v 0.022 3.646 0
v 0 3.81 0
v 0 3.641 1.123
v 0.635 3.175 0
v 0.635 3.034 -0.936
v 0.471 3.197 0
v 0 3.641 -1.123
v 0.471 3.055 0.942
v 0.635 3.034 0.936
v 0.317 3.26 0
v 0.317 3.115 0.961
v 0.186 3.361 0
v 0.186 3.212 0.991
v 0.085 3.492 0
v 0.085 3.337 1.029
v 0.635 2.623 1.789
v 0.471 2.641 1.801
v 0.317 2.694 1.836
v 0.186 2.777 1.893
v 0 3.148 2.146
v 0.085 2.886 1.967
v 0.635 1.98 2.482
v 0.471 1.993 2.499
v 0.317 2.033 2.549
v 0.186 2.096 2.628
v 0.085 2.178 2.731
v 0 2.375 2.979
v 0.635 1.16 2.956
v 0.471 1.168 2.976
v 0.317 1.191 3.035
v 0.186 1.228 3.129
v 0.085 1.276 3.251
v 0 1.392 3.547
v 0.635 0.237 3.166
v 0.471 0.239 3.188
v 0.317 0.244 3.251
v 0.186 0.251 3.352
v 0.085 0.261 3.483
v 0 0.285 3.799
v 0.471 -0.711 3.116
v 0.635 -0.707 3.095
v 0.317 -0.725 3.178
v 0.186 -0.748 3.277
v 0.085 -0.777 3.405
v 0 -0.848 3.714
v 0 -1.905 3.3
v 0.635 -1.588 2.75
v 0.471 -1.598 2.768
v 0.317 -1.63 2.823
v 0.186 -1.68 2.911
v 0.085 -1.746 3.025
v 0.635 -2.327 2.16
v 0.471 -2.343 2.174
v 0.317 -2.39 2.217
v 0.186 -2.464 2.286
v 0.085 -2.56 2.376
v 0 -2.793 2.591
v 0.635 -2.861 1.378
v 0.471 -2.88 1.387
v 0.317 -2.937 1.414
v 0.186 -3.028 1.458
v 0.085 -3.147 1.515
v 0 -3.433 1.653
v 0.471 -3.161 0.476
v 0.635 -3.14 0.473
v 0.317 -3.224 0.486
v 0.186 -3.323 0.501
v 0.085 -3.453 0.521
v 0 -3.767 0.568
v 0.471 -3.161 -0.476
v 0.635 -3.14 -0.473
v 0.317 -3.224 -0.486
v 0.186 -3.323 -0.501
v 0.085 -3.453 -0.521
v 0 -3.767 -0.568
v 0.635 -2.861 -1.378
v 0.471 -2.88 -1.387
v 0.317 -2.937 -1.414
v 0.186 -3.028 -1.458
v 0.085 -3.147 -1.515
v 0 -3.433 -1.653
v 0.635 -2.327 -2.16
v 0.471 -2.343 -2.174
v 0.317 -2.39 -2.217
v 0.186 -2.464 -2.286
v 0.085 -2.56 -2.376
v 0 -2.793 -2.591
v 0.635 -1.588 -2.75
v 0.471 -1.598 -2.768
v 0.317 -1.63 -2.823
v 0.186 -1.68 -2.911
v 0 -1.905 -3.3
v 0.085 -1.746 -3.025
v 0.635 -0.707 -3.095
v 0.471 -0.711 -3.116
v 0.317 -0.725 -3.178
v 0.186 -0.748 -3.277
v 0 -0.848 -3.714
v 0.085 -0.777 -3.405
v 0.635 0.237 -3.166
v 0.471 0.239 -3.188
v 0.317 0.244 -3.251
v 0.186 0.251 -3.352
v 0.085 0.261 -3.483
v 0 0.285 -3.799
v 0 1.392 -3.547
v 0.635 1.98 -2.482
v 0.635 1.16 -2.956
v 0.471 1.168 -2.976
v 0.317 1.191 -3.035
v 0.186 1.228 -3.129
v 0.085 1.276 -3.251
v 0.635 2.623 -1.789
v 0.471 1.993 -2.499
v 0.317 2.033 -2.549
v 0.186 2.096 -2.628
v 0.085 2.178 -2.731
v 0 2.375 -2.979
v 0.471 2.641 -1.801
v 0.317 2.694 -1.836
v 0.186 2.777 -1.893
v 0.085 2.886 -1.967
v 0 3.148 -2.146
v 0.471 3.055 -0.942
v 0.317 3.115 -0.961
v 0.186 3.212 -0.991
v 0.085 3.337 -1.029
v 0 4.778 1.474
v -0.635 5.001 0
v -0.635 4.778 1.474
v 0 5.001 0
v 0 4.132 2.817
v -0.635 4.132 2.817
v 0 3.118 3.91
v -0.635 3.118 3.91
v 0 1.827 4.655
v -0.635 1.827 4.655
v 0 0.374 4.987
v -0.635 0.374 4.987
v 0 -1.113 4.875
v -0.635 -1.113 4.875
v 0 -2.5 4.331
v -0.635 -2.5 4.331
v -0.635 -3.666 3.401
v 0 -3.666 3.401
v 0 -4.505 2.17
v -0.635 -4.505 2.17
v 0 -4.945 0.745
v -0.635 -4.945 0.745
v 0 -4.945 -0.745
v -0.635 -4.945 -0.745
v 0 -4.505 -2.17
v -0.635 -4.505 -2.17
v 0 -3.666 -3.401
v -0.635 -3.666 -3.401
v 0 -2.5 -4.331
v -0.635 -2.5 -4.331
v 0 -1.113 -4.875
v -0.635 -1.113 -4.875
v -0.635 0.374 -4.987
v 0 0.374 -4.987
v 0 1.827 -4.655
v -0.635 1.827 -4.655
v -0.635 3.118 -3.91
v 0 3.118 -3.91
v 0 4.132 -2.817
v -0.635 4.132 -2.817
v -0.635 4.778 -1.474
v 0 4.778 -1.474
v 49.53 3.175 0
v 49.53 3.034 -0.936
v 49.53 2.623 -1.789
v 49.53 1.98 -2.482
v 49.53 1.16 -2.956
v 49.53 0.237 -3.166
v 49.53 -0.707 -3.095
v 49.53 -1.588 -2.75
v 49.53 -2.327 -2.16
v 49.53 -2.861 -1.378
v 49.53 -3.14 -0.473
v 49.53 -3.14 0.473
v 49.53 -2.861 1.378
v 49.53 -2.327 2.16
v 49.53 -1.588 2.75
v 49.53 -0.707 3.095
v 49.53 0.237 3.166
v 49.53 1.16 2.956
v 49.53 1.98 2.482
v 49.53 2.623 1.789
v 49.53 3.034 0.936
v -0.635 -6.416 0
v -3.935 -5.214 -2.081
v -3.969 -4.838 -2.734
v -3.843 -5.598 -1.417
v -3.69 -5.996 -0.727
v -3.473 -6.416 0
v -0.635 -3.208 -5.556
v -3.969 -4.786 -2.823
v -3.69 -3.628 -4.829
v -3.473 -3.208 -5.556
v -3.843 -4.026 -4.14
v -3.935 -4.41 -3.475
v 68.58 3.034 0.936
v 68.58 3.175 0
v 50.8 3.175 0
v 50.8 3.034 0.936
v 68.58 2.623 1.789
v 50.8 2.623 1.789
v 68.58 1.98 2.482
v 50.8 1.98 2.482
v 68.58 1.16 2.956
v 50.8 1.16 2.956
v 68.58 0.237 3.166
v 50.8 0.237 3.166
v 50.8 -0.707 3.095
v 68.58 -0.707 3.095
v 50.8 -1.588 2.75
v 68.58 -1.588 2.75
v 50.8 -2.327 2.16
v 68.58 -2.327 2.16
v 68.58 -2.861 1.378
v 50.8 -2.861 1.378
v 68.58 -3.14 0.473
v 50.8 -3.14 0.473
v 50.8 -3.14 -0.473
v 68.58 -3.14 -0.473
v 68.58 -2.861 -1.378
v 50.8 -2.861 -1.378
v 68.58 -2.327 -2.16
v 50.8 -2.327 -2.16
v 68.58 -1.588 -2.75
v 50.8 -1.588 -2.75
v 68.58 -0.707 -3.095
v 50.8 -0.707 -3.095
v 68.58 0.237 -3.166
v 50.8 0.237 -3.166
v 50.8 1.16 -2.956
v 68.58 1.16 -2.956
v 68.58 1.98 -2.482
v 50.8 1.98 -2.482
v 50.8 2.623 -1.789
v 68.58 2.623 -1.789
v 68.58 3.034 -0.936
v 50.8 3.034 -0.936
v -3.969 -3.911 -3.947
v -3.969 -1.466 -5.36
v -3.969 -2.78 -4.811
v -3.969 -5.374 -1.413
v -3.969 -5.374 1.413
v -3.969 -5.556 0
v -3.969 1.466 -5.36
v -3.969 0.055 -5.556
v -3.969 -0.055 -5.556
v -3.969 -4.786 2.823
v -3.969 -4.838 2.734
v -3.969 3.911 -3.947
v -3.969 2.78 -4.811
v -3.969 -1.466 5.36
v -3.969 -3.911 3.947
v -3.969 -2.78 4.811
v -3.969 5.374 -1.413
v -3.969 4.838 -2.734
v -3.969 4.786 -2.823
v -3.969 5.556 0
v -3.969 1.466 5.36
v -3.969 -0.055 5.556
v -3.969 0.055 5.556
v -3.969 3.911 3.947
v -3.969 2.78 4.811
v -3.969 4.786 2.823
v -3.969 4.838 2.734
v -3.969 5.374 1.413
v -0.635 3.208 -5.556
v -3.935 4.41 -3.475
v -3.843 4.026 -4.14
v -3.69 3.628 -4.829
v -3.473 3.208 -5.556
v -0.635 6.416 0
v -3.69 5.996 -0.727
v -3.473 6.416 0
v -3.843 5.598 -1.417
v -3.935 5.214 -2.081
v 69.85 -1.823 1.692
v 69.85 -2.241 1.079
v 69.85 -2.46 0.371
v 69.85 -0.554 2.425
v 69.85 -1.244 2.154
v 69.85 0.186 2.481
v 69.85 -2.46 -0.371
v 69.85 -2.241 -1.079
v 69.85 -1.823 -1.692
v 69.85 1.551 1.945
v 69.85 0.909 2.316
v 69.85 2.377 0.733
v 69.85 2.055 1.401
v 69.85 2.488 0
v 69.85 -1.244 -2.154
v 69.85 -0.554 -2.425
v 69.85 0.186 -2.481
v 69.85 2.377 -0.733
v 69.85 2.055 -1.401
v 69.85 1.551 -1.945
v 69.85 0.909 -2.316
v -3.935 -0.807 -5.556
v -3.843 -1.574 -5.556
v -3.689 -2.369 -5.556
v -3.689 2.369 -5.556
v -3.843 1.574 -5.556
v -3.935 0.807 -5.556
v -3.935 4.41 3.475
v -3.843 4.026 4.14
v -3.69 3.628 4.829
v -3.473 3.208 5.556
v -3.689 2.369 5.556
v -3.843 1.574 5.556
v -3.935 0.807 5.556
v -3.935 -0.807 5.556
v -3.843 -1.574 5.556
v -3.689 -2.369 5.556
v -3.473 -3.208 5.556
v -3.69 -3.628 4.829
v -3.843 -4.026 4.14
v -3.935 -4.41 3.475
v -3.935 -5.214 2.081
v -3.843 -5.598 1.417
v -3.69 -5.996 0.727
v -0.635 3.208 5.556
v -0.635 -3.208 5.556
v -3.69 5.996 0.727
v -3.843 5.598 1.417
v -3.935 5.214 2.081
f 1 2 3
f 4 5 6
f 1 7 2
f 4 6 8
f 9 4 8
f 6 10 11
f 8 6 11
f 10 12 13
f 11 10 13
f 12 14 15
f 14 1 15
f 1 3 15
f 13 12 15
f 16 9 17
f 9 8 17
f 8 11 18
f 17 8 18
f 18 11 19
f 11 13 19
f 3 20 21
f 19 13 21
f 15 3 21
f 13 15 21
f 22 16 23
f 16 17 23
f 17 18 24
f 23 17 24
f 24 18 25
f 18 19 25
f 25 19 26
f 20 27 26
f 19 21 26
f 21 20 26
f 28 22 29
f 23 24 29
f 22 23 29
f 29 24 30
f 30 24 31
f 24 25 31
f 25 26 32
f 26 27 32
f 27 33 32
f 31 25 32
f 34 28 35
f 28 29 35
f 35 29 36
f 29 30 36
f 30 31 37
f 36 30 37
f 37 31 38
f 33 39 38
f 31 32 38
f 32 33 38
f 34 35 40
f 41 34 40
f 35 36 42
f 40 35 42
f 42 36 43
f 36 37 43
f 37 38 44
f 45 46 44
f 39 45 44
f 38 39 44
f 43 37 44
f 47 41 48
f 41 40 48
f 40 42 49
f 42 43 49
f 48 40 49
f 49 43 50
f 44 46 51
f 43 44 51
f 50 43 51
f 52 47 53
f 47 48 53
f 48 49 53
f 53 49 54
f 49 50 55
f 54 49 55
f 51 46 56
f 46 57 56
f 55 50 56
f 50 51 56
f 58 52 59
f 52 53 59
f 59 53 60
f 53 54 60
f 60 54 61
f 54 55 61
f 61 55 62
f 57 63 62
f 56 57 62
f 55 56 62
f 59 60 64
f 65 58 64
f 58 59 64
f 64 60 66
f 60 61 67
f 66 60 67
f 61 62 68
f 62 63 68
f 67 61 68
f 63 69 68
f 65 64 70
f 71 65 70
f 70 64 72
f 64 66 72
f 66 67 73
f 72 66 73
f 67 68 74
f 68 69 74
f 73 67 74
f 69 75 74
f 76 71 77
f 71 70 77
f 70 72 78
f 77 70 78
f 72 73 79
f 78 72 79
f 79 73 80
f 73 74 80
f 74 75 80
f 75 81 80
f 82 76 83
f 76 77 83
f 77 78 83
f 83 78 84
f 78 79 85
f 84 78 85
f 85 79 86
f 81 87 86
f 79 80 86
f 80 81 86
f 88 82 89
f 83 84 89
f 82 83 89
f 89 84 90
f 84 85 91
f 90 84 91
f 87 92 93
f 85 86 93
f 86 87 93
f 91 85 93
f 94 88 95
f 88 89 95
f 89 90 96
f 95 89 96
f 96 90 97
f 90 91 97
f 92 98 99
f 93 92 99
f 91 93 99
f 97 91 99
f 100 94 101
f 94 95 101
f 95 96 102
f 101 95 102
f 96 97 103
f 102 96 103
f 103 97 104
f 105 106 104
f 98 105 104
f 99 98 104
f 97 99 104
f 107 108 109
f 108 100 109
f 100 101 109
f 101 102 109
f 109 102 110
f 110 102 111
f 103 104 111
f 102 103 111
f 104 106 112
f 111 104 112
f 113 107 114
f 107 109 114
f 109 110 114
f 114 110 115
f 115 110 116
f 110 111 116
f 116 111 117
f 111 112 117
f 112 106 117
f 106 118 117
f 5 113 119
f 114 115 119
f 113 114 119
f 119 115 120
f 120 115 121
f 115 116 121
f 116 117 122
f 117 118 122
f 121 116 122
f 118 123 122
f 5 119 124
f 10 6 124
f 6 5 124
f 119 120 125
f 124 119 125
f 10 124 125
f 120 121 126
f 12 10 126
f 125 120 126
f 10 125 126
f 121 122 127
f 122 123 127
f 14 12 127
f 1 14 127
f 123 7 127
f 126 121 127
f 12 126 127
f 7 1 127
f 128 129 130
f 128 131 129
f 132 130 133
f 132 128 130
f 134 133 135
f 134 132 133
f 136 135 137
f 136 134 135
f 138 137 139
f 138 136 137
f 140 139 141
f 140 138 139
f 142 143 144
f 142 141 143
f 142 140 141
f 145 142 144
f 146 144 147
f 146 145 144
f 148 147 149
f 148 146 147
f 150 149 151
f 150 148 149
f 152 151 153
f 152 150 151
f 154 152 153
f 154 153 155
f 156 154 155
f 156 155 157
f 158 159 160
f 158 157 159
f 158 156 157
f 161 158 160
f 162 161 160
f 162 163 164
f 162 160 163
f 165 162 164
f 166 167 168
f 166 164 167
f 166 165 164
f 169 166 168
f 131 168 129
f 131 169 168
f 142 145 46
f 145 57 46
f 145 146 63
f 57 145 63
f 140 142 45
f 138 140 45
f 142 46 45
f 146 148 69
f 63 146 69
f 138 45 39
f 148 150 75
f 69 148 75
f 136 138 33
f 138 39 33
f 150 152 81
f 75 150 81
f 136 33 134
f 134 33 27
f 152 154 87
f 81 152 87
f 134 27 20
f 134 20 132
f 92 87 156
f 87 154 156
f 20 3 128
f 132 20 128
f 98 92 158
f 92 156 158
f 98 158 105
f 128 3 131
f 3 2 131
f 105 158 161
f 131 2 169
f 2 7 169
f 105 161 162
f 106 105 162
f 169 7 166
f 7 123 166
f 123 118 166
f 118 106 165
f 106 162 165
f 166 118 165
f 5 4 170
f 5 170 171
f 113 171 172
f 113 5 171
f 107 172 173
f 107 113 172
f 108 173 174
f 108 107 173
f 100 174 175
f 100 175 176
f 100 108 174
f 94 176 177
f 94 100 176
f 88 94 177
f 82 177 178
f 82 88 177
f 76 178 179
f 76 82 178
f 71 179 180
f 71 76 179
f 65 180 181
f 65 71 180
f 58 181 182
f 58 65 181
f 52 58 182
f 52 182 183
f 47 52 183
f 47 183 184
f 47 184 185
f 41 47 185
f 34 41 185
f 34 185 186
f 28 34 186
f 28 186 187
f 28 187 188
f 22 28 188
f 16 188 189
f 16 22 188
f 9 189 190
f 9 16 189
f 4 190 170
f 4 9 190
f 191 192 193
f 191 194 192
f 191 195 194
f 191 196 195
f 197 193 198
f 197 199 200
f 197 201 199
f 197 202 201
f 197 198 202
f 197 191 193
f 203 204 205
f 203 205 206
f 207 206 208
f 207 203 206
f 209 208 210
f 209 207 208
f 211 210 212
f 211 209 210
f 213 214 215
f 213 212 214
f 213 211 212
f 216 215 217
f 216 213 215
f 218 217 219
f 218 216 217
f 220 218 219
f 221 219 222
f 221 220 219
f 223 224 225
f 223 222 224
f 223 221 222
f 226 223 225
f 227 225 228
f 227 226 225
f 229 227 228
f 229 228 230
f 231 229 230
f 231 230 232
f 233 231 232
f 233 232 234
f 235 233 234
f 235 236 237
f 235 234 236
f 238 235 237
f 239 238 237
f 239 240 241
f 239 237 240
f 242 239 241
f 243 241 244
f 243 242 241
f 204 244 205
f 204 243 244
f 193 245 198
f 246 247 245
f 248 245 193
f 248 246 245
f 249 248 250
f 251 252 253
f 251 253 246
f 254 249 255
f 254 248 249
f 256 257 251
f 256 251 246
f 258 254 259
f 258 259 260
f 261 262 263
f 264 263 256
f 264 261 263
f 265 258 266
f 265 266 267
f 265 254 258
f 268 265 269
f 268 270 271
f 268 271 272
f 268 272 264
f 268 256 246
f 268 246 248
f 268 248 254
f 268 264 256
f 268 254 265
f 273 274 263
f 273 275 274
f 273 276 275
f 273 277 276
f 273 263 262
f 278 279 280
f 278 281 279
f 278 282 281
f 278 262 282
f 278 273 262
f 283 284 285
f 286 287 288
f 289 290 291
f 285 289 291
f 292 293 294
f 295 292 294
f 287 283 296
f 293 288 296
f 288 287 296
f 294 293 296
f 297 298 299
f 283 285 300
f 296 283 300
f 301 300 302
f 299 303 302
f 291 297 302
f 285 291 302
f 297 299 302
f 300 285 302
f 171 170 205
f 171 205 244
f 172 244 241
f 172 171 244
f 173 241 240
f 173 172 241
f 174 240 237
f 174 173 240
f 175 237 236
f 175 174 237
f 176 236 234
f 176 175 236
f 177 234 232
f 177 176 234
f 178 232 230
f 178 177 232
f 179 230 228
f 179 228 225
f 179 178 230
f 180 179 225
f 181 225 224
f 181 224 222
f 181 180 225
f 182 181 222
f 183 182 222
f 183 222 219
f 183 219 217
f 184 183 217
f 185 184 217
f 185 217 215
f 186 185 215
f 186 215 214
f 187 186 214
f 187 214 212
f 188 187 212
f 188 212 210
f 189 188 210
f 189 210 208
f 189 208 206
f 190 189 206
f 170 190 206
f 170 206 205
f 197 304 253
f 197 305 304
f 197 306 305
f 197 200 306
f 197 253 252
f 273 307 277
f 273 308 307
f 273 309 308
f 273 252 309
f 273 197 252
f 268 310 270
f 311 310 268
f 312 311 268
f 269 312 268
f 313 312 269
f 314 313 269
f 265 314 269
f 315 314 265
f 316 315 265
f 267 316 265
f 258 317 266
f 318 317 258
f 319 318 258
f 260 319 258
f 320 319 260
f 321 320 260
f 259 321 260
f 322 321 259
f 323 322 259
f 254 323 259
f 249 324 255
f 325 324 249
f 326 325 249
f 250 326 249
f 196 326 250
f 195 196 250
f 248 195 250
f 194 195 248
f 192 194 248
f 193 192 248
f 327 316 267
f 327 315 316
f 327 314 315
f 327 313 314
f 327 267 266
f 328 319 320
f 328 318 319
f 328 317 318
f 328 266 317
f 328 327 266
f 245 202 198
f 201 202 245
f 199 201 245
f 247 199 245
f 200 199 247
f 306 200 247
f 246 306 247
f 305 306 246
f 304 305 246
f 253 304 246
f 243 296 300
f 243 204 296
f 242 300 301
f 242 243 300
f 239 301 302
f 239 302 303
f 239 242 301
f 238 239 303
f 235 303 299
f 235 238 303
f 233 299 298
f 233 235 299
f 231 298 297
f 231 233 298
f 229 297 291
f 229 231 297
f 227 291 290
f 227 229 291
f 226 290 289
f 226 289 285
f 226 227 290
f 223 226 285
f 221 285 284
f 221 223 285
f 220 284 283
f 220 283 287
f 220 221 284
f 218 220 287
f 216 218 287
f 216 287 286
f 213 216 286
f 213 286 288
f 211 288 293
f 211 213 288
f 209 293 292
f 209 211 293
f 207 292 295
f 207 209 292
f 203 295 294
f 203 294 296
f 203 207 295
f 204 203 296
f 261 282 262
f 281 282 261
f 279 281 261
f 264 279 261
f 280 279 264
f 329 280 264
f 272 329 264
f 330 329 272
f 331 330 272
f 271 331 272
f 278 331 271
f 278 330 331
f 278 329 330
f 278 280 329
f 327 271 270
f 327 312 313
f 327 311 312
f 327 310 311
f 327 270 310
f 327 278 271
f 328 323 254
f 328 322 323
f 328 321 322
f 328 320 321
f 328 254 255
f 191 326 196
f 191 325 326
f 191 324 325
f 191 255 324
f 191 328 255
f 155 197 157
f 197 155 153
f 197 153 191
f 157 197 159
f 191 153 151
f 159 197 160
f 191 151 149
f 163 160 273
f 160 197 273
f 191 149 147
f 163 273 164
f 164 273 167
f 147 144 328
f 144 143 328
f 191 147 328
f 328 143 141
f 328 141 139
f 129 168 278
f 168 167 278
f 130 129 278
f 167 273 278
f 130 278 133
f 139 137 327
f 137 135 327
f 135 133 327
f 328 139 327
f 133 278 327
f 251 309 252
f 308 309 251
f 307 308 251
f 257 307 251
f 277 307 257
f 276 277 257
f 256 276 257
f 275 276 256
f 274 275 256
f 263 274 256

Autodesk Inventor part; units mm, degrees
ref_plane "YZ Plane" through (0, 0, 0) normal (1, 0, 0) x (0, 1, 0)
ref_plane "XZ Plane" through (0, 0, 0) normal (0, 1, 0) x (-1, 0, 0)
sketch "Sketch1" plane through (0, 0, 0) normal (0, 0, 1) x (1, 0, 0)
  line L0 (0, 5.0006) -> (0, 3.175)
  line L1 (50.8, 3.175) -> (69.85, 3.175)
  line L2 (69.85, 3.175) -> (69.85, 0)
  line L3 (69.85, 0) -> (-0.6351, 0)
  line L4 (-14.7321, 0) -> (83.947, 0) projected
  line L5 (-0.6351, 0) -> (-0.6351, 5.0006)
  line L6 (-0.6351, 5.0006) -> (0, 5.0006)
  line L7 (50.8, 3.175) -> (49.5299, 3.175)
  line L8 (49.5299, 3.175) -> (0, 3.175)
  line L9 (0, -1.0001) -> (0, 6.0007) projected
  dimension "d0" = 69.85
  dimension "d1" = 19.05
  dimension "d2" = 6.35
  dimension "d9" = 0.6351
  dimension "d10" = 10.0013
  dimension "d13" = 1.2701
  dimension "d14" = 6.35
revolve "Body" add sketch "Sketch1" angle 360 about axis through (69.85, 0, 0) along (-1, 0, 0)
sketch "Sketch2" plane through (-0.6351, 0, 0) normal (-1, 0, 0) x (0, 0, 1)
  line L0 (0, 6.4158) -> (5.5562, 3.2079)
  line L1 (5.5562, 3.2079) -> (5.5562, -3.2079)
  line L2 (5.5562, -3.2079) -> (0, -6.4158)
  line L3 (0, -6.4158) -> (-5.5562, -3.2079)
  line L4 (-5.5562, -3.2079) -> (-5.5562, 3.2079)
  line L5 (-5.5562, 3.2079) -> (0, 6.4158)
  point P0 (0, 0)
  point P1 (0, 0)
  dimension "d11" = 11.1125
extrude "Head" add sketch "Sketch2" along normal blind 3.3337
sketch "Sketch4" plane through (0, 0, 0) normal (0, 0, 1) x (1, 0, 0)
  line L0 (-3.9689, 5.5563) -> (-3.9689, 6.4158)
  line L1 (-3.9689, 6.4158) -> (-3.4726, 6.4158)
  line L2 (-3.4726, 6.4158) -> (-3.9689, 5.5563)
  line L3 (-4.6356, 0) -> (0.0317, 0) projected
  line L4 (-0.6351, 6.4158) -> (-3.9688, 6.4158) projected
  line L5 (-3.9688, 3.2079) -> (-3.9688, 6.4158) projected
  dimension "d5" = 30
  dimension "d19" = 11.1125
revolve "Chamfer1" cut sketch "Sketch4" angle 360 about axis through (-10, 0, 0) along (1, 0, 0)
thread "Thread" size "1/4-20 UNC" class "2A" standard "ANSI Unified Screw Threads" length 19.05
chamfer "Chamfer2" distance 0.6875 distance2 1.2701 1 edges at (69.85, -3.175, 0) measured on face at (69.85, -0.7922, -0.7018)
ref_plane "Work Plane1" through (1.525, 0, 0) normal (0, 0, 1) x (1, 0, 0)
fillet "Fillet2" radius 0.635 1 edges at (0, -3.175, 0)
equation "\"d0\" = NLG"
equation "\"d1\" = GEL"
equation "\"d2\" = GD"
equation "\"d10\" = SD2"
equation "\"d14\" = BDM"
equation "\"d11\" = SW"
equation "\"d3\" = KOH - SD"
equation "\"d5\" = ANG1"
equation "\"d19\" = SW0"
equation "\"d63\" = R"
equation "\"d15\" = GEL"
equation "\"d6\" = -0.5 * SPD + 0.5 * GD"
equation "\"NLG\" = 69.85"
equation "\"GD\" = NND"
equation "\"BDM\" = 6.35"
equation "\"KOH\" = 3.96875"
equation "\"GEL\" = 19.05"
equation "\"SW\" = 11.1125"
equation "\"SW0\" = SW"
equation "\"SPD\" = 4.9751"
equation "\"SD2\" = 10.00125"
equation "\"SD\" = 0.635"
equation "\"ANG1\" = 30deg"
equation "\"GAL\" = 1.27"
equation "\"GUL\" = 1.27"
equation "\"R\" = 0.635"
equation "\"d62\" = -NLG - SD + GUL"
equation "\"THREADDIA\" = 6.35"
equation "\"TOA\" = 30deg"
equation "\"RR\" = 0.254"
equation "\"NND\" = 6.35"
equation "\"E0\" = 1.155 * SW"
equation "\"SLG\" = 0"
equation "\"GD1\" = 4.9751"
properties part number "ANSI B18.2.1 - 1/4-20 UNC - 2.75" material "Steel, Mild"
